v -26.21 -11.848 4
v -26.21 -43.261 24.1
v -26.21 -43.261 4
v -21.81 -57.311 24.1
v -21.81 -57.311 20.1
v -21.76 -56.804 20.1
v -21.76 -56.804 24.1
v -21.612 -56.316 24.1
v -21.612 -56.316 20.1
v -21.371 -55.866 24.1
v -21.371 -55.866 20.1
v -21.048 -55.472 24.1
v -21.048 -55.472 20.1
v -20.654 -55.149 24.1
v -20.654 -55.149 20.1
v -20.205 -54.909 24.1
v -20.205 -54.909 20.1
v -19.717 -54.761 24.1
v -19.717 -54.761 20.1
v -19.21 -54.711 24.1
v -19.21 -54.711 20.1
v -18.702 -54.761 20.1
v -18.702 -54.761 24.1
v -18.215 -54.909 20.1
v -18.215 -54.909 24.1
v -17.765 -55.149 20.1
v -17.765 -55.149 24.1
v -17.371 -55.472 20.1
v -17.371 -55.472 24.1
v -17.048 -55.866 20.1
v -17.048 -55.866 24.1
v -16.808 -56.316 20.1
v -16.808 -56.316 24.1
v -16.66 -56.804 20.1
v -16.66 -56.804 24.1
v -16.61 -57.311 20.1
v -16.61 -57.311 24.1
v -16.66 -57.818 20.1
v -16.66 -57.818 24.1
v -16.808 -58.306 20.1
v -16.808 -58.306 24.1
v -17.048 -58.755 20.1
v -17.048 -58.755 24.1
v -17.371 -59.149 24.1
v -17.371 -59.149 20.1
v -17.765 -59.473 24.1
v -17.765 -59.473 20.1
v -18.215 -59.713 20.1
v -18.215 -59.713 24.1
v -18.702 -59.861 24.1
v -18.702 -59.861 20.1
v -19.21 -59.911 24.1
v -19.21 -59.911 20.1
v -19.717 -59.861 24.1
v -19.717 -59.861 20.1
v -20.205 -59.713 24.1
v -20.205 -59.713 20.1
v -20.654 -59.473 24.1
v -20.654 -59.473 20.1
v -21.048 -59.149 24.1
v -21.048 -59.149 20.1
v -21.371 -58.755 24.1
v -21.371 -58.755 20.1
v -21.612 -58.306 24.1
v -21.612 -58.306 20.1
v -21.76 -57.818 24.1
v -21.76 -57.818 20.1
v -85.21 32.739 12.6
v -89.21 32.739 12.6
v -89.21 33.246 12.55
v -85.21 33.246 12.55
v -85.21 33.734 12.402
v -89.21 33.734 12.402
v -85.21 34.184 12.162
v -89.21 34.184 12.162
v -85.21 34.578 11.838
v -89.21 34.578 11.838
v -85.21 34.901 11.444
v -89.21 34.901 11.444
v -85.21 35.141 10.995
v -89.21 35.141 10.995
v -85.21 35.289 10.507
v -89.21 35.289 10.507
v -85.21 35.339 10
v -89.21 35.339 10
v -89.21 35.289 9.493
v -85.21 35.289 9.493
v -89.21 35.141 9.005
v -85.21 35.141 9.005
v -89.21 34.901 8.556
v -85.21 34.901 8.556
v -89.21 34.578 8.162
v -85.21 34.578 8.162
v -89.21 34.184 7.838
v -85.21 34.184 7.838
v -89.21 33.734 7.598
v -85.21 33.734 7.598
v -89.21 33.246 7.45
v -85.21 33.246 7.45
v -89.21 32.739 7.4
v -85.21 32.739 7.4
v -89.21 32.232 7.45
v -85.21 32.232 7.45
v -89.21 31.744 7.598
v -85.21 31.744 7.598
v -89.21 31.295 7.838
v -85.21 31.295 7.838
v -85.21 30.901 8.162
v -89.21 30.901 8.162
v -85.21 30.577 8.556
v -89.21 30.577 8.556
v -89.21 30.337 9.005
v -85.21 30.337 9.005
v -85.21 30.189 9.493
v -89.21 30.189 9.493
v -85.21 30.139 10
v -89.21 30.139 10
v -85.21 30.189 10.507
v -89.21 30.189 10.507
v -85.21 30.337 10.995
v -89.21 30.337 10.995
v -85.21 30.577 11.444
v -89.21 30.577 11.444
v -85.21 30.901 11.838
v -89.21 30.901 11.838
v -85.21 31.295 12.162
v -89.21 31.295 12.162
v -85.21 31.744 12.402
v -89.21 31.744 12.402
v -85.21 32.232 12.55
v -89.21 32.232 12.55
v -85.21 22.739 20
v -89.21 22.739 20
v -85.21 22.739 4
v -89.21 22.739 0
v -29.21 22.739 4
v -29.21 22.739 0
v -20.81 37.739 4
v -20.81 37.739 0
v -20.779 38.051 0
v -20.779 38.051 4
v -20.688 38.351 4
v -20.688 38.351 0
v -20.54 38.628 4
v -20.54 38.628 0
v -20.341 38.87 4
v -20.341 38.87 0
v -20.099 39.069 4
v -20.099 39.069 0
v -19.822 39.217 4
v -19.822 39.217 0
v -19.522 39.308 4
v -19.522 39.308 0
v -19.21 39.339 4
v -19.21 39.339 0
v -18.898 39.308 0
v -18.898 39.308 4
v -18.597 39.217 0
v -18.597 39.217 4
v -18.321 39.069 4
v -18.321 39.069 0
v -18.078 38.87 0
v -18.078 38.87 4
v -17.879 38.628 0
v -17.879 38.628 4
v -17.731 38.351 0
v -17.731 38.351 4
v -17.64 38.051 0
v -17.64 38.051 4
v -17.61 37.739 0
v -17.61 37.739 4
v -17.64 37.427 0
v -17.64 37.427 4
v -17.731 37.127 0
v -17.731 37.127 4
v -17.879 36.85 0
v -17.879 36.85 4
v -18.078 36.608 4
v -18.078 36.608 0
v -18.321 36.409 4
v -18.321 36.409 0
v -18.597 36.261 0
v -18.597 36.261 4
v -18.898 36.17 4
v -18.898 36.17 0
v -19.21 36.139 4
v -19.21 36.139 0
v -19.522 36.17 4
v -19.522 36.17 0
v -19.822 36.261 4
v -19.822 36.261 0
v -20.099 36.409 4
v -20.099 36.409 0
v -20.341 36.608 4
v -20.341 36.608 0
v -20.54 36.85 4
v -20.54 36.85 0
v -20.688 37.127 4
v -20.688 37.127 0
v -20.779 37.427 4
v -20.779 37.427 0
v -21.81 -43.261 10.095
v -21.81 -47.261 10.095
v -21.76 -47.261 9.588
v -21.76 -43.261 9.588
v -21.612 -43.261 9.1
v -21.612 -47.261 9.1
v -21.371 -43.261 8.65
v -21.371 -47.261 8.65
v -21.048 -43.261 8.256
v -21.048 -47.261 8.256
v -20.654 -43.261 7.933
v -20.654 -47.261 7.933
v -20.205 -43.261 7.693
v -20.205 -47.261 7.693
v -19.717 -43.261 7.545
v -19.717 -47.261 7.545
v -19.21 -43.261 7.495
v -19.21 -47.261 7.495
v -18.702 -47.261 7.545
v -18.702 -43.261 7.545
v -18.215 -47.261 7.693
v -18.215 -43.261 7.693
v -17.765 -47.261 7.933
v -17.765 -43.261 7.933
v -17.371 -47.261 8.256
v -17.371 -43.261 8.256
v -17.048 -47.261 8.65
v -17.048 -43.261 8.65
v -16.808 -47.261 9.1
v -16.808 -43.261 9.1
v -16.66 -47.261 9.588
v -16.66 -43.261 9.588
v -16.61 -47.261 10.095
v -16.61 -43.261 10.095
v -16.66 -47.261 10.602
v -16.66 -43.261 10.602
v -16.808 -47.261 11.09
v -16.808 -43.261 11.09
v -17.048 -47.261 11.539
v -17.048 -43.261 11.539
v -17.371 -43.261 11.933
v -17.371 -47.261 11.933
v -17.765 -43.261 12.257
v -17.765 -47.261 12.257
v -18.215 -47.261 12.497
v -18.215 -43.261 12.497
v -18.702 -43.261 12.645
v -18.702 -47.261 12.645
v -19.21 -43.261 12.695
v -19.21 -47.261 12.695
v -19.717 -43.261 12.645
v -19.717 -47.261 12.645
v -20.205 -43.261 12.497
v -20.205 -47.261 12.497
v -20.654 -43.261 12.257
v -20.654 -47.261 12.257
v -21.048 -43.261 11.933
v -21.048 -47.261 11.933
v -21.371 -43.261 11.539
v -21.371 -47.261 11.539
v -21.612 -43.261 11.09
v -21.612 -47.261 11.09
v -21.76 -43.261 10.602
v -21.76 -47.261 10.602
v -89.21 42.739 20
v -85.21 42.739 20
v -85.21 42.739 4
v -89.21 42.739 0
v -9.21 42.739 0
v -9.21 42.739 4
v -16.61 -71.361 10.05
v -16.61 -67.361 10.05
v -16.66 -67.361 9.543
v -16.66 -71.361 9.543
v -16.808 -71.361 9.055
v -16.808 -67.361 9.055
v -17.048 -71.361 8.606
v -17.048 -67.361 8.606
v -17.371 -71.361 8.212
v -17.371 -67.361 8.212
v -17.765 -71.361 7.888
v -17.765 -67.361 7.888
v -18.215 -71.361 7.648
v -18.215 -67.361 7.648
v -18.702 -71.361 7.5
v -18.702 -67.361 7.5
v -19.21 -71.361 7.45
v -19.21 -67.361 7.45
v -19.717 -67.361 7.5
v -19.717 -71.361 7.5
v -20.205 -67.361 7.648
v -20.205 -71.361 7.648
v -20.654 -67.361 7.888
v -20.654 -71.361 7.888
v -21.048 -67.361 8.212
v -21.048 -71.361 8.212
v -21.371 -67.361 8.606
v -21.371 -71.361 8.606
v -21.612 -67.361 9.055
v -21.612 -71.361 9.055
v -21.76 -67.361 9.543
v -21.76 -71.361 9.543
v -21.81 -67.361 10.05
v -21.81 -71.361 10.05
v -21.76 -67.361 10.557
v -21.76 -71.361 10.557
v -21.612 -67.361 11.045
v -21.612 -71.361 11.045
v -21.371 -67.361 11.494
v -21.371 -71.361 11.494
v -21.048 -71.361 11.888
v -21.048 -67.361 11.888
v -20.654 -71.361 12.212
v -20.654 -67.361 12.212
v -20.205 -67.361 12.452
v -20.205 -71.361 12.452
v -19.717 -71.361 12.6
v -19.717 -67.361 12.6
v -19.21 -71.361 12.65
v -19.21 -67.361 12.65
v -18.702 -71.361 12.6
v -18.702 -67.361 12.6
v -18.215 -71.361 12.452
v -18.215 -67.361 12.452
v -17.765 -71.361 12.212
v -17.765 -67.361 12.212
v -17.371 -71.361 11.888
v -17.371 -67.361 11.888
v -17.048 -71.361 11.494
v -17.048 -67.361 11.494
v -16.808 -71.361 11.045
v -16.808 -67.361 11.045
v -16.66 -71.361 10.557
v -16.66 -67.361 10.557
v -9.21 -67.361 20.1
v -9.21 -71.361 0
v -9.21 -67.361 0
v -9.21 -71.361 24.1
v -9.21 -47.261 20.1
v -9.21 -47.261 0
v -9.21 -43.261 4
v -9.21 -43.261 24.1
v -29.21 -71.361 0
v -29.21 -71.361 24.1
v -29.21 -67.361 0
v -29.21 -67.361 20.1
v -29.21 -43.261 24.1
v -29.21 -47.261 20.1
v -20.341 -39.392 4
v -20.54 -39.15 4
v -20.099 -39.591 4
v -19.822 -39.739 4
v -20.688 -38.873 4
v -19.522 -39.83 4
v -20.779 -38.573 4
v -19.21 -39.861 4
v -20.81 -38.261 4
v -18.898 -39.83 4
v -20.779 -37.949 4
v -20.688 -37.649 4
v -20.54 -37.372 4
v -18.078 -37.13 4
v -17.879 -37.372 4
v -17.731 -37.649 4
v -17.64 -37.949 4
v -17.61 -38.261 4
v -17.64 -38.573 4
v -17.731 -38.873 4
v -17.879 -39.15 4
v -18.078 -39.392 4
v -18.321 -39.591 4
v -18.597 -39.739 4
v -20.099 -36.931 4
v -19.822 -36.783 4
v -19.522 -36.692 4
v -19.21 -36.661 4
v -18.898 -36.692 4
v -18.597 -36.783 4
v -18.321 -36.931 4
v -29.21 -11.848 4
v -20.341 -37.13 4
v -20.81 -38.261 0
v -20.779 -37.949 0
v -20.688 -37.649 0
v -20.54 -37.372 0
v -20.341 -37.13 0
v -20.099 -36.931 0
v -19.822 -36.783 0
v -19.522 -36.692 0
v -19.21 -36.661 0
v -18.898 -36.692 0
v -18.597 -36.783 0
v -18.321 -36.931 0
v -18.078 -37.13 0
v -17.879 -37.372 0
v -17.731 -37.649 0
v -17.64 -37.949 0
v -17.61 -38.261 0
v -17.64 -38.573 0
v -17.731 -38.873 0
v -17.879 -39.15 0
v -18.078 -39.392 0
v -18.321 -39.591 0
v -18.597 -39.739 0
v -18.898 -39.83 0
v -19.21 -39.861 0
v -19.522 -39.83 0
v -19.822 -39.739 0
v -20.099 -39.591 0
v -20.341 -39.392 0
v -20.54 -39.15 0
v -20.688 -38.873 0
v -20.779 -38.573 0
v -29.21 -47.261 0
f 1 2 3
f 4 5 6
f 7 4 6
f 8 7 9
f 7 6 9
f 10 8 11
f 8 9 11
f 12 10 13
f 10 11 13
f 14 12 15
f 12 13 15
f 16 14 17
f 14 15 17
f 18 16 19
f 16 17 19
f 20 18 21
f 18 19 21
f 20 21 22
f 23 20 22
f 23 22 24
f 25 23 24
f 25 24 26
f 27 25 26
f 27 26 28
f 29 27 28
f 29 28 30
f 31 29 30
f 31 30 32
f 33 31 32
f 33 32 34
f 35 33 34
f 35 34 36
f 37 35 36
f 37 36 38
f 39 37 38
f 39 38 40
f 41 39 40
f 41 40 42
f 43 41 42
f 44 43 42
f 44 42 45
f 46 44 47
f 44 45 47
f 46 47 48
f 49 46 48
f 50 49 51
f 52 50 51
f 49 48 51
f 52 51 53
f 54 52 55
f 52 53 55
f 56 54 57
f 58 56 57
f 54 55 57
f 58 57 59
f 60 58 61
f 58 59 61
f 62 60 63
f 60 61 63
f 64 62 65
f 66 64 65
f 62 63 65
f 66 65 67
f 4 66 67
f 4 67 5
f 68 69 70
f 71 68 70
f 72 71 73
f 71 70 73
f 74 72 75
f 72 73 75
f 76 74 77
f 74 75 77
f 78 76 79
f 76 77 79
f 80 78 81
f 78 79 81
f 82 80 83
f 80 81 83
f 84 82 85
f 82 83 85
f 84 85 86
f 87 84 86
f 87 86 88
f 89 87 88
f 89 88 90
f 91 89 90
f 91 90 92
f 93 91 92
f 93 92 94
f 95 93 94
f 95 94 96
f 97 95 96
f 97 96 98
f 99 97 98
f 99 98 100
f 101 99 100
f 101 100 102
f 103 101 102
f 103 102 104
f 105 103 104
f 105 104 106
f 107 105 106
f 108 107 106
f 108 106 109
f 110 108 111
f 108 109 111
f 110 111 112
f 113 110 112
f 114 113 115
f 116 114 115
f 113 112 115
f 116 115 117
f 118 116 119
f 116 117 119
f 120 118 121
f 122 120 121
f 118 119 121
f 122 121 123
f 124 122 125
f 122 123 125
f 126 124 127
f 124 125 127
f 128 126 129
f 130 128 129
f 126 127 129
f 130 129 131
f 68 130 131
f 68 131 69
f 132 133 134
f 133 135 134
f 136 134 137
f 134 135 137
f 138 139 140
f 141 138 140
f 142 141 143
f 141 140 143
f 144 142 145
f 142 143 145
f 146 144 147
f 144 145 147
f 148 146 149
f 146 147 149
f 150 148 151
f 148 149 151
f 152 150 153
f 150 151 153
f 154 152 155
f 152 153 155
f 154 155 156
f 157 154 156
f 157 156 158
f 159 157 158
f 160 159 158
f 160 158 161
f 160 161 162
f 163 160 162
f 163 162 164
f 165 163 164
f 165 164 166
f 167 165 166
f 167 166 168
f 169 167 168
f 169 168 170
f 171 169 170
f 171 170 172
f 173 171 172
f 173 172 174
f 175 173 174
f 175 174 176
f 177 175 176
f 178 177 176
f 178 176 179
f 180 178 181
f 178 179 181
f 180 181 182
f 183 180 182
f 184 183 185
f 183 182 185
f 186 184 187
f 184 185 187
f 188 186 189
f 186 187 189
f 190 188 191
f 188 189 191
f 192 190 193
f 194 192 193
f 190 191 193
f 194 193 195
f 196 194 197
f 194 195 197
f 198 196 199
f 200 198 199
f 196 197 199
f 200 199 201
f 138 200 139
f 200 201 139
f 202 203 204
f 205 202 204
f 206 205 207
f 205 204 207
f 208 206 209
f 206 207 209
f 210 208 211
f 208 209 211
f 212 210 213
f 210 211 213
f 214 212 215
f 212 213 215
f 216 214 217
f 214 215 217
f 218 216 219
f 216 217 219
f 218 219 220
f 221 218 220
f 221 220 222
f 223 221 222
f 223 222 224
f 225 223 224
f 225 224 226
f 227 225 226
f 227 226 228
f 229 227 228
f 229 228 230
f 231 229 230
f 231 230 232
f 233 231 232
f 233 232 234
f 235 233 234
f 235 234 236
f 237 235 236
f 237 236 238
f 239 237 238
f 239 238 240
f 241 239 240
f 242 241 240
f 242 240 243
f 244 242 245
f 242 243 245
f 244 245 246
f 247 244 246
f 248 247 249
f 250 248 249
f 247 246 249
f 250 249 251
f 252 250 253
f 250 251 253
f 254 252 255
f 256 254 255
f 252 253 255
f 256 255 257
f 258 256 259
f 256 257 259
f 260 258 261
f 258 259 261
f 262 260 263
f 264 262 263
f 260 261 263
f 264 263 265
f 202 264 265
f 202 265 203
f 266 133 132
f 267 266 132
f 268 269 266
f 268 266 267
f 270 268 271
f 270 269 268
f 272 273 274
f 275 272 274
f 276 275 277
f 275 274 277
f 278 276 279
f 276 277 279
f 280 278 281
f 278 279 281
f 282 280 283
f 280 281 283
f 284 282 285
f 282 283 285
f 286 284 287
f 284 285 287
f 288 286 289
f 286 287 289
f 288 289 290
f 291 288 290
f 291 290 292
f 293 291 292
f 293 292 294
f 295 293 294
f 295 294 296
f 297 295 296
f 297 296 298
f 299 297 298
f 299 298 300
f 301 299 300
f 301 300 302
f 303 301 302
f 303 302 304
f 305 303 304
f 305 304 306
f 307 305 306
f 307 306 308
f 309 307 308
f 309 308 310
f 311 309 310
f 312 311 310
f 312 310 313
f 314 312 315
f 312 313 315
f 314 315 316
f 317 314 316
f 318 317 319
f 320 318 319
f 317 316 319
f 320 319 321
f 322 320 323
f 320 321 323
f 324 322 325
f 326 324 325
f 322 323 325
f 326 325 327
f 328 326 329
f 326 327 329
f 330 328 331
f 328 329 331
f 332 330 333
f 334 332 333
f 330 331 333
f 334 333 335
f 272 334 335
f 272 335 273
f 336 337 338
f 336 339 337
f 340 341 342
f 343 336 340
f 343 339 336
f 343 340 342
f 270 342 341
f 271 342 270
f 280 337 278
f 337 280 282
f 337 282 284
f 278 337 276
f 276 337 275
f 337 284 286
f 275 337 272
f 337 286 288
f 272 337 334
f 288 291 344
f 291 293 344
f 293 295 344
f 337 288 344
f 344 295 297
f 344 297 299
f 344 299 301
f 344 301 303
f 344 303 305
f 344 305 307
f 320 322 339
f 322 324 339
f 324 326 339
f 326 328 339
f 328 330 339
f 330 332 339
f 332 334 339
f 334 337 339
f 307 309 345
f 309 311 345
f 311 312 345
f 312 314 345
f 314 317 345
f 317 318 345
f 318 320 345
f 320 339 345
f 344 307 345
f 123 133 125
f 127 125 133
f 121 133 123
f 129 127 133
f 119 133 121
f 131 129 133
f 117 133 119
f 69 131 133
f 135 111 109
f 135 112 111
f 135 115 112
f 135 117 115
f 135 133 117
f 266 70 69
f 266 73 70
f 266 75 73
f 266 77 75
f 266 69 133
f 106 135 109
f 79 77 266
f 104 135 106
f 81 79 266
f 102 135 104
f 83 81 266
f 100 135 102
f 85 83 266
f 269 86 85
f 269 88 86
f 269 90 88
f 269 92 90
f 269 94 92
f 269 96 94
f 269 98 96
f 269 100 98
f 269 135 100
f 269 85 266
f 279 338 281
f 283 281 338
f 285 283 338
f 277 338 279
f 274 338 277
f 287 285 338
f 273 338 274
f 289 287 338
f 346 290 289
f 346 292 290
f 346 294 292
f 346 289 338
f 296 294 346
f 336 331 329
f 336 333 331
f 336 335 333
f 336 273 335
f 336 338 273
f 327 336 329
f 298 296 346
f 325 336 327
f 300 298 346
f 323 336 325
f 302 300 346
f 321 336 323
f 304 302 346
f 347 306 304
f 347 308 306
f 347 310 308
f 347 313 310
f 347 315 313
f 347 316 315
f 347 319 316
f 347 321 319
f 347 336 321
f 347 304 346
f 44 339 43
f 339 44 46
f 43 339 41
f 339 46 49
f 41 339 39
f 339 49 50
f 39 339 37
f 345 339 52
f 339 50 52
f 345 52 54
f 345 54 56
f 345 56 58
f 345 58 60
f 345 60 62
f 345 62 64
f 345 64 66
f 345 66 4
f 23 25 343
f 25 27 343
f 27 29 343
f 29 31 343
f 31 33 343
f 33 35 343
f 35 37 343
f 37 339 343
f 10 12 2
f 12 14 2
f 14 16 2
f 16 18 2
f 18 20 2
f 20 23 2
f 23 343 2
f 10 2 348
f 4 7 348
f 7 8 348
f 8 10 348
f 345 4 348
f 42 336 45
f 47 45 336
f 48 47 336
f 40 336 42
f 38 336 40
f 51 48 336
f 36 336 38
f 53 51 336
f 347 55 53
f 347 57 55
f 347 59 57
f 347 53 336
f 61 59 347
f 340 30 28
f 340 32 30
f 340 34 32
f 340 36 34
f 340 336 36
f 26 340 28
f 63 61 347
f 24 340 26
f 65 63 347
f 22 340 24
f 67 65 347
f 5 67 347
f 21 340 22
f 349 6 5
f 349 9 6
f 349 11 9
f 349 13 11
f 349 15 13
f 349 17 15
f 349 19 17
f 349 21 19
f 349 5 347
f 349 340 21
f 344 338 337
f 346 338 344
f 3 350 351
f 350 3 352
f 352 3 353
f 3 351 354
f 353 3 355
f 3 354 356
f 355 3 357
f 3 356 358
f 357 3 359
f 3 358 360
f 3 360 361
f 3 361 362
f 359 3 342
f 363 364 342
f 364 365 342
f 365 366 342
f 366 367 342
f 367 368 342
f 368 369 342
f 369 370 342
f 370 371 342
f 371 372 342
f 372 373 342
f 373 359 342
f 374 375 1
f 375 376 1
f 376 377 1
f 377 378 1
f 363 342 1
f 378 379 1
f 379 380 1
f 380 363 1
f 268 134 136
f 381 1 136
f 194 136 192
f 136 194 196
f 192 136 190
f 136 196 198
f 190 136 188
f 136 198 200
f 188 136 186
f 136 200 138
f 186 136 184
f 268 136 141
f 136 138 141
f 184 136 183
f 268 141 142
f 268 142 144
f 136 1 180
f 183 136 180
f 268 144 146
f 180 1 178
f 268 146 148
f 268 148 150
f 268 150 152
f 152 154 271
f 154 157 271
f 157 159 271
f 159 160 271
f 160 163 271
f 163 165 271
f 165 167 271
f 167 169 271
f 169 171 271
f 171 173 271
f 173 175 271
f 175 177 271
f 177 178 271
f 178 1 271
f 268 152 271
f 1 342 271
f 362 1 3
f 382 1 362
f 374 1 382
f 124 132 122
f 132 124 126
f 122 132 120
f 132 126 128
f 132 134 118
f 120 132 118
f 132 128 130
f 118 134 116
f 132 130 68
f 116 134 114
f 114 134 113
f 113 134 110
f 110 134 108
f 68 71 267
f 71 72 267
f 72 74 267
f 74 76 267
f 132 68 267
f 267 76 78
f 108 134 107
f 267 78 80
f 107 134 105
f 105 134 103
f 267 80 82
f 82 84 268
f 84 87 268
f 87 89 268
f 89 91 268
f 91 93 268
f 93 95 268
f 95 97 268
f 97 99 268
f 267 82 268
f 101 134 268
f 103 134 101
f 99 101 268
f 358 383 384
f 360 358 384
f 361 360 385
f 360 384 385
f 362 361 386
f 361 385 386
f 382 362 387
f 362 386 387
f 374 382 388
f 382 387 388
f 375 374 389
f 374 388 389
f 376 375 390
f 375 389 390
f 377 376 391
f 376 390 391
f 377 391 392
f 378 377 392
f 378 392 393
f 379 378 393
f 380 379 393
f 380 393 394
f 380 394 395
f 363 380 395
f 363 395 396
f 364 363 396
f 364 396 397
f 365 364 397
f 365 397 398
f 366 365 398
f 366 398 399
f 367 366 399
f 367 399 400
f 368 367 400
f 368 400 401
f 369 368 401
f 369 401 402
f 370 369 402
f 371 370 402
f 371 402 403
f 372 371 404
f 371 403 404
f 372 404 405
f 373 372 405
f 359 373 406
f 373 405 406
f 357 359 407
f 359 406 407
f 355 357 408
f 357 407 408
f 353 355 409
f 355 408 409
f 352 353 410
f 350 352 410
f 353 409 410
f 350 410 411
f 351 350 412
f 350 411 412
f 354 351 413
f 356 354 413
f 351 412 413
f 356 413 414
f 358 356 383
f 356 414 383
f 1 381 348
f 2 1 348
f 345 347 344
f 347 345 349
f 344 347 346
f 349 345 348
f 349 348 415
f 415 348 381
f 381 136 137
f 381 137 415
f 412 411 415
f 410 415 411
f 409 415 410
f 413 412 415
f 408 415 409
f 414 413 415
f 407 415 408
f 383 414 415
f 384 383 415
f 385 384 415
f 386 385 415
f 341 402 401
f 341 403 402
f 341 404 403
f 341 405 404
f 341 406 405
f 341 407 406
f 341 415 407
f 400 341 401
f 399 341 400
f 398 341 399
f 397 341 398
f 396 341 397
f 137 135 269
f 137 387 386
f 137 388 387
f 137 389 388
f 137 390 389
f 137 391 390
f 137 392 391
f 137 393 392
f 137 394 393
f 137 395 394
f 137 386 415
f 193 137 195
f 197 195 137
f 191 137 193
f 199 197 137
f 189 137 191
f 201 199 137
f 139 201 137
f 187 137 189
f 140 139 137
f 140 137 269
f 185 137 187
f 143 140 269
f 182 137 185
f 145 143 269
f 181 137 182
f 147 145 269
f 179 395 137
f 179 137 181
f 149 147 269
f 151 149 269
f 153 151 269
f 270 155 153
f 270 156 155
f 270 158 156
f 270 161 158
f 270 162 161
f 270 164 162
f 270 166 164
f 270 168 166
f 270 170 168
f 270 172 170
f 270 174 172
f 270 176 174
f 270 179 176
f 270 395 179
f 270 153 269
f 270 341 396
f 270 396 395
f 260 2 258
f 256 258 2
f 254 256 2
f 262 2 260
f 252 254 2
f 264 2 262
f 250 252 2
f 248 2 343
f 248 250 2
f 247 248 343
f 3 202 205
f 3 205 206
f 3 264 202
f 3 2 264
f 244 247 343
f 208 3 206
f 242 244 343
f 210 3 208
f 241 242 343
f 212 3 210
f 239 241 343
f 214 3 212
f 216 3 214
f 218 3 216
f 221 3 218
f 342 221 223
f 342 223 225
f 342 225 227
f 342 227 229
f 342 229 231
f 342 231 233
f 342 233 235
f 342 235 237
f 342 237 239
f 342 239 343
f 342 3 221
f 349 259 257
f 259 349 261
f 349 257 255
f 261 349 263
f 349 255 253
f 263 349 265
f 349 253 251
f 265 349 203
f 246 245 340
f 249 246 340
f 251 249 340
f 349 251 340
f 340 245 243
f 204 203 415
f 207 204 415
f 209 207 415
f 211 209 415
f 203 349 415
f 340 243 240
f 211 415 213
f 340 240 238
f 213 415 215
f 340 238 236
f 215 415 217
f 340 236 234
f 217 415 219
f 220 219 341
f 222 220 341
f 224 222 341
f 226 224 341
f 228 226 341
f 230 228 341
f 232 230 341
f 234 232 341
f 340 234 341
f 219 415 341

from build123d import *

# Parameters (mm, degrees)
SKETCH_1_W          = 20
SKETCH_1_H          = 90
EXTRUDE_1_DEPTH     = 4
SKETCH_2_W          = 20
SKETCH_2_H          = 4
EXTRUDE_2_DEPTH     = 20.1
SKETCH_3_W          = 20
SKETCH_3_H          = 4
EXTRUDE_3_DEPTH     = 24.1
SKETCH_4_W          = 20
SKETCH_4_H          = 4
EXTRUDE_4_DEPTH     = 20.1
SKETCH_5_R          = 2.6
CUT_EXTRUDE_1_DEPTH = 20
SKETCH_6_R          = 2.6
CUT_EXTRUDE_2_DEPTH = 20
SKETCH_7_R          = 2.6
CUT_EXTRUDE_3_DEPTH = 20
SKETCH_9_R          = 1.6
CUT_EXTRUDE_4_DEPTH = 20
EXTRUDE_6_DEPTH     = 3
SKETCH_14_W         = 4
SKETCH_14_H         = 20
EXTRUDE_7_DEPTH     = 60
SKETCH_15_W         = 4
SKETCH_15_H         = 20
EXTRUDE_8_DEPTH     = 16
SKETCH_17_R         = 2.6
CUT_EXTRUDE_6_DEPTH = 20


with BuildPart() as part:
    # 草图1 → 凸台-拉伸1 (new body)
    with BuildSketch(Plane.XY):
        with Locations((-19.209677061, -2.260885663)):
            Rectangle(SKETCH_1_W, SKETCH_1_H)
    extrude(amount=EXTRUDE_1_DEPTH)

    # 草图2 → 凸台-拉伸2 (add)
    with BuildSketch(Plane.XY.offset(4)):
        with Locations((-19.209677061, -45.260885663)):
            Rectangle(SKETCH_2_W, SKETCH_2_H)
    extrude(amount=EXTRUDE_2_DEPTH)

    # 草图3 → 凸台-拉伸3 (add)
    with BuildSketch(Plane(origin=(0, -47.260885663, 0), x_dir=(-1, 0, 0), z_dir=(0, -1, 0))):
        with Locations((19.209677061, -22.1)):
            Rectangle(SKETCH_3_W, SKETCH_3_H)
    extrude(amount=EXTRUDE_3_DEPTH)

    # 草图4 → 凸台-拉伸4 (add)
    with BuildSketch(Plane(origin=(0, 0, 20.1), x_dir=(-1, 0, 0), z_dir=(0, 0, -1))):
        with Locations((19.209677061, -69.360885663)):
            Rectangle(SKETCH_4_W, SKETCH_4_H)
    extrude(amount=EXTRUDE_4_DEPTH)

    # 草图5 → 切除-拉伸1 (cut)
    with BuildSketch(Plane(origin=(0, -47.260885663, 0), x_dir=(-1, 0, 0), z_dir=(0, -1, 0))):
        with Locations((19.209677061, -10.094759339)):
            Circle(SKETCH_5_R)
    extrude(amount=-CUT_EXTRUDE_1_DEPTH, mode=Mode.SUBTRACT)

    # 草图6 → 切除-拉伸2 (cut)
    with BuildSketch(Plane(origin=(0, 0, 20.1), x_dir=(-1, 0, 0), z_dir=(0, 0, -1))):
        with Locations((19.209677061, -57.310885663)):
            Circle(SKETCH_6_R)
    extrude(amount=-CUT_EXTRUDE_2_DEPTH, mode=Mode.SUBTRACT)

    # 草图7 → 切除-拉伸3 (cut)
    with BuildSketch(Plane(origin=(0, -67.360885663, 0), x_dir=(1, 0, 0), z_dir=(0, 1, 0))):
        with Locations((-19.209677061, -10.05)):
            Circle(SKETCH_7_R)
    extrude(amount=-CUT_EXTRUDE_3_DEPTH, mode=Mode.SUBTRACT)

    # 草图9 → 切除-拉伸4 (cut)
    with BuildSketch(Plane(origin=(0, 0, 0), x_dir=(-1, 0, 0), z_dir=(0, 0, -1))):
        with Locations((19.209677061, 37.739114337)):
            Circle(SKETCH_9_R)
        with Locations((19.209677061, -38.260885663)):
            Circle(SKETCH_9_R)
    extrude(amount=-CUT_EXTRUDE_4_DEPTH, mode=Mode.SUBTRACT)

    # 草图13 → 凸台-拉伸6 (add)
    with BuildSketch(Plane.ZY.offset(29.209677061)):
        Polygon((4, -11.848280973), (24.1, -43.260885663), (4, -43.260885663), align=None)
    extrude(amount=-EXTRUDE_6_DEPTH)

    # 草图14 → 凸台-拉伸7 (add)
    with BuildSketch(Plane.ZY.offset(29.209677061)):
        with Locations((2, 32.739114337)):
            Rectangle(SKETCH_14_W, SKETCH_14_H)
    extrude(amount=EXTRUDE_7_DEPTH)

    # 草图15 → 凸台-拉伸8 (add)
    with BuildSketch(Plane.XY.offset(4)):
        with Locations((-87.209677061, 32.739114337)):
            Rectangle(SKETCH_15_W, SKETCH_15_H)
    extrude(amount=EXTRUDE_8_DEPTH)

    # 草图17 → 切除-拉伸6 (cut)
    with BuildSketch(Plane.ZY.offset(89.209677061)):
        with Locations((10, 32.739114337)):
            Circle(SKETCH_17_R)
    extrude(amount=-CUT_EXTRUDE_6_DEPTH, mode=Mode.SUBTRACT)


solid = part.part
